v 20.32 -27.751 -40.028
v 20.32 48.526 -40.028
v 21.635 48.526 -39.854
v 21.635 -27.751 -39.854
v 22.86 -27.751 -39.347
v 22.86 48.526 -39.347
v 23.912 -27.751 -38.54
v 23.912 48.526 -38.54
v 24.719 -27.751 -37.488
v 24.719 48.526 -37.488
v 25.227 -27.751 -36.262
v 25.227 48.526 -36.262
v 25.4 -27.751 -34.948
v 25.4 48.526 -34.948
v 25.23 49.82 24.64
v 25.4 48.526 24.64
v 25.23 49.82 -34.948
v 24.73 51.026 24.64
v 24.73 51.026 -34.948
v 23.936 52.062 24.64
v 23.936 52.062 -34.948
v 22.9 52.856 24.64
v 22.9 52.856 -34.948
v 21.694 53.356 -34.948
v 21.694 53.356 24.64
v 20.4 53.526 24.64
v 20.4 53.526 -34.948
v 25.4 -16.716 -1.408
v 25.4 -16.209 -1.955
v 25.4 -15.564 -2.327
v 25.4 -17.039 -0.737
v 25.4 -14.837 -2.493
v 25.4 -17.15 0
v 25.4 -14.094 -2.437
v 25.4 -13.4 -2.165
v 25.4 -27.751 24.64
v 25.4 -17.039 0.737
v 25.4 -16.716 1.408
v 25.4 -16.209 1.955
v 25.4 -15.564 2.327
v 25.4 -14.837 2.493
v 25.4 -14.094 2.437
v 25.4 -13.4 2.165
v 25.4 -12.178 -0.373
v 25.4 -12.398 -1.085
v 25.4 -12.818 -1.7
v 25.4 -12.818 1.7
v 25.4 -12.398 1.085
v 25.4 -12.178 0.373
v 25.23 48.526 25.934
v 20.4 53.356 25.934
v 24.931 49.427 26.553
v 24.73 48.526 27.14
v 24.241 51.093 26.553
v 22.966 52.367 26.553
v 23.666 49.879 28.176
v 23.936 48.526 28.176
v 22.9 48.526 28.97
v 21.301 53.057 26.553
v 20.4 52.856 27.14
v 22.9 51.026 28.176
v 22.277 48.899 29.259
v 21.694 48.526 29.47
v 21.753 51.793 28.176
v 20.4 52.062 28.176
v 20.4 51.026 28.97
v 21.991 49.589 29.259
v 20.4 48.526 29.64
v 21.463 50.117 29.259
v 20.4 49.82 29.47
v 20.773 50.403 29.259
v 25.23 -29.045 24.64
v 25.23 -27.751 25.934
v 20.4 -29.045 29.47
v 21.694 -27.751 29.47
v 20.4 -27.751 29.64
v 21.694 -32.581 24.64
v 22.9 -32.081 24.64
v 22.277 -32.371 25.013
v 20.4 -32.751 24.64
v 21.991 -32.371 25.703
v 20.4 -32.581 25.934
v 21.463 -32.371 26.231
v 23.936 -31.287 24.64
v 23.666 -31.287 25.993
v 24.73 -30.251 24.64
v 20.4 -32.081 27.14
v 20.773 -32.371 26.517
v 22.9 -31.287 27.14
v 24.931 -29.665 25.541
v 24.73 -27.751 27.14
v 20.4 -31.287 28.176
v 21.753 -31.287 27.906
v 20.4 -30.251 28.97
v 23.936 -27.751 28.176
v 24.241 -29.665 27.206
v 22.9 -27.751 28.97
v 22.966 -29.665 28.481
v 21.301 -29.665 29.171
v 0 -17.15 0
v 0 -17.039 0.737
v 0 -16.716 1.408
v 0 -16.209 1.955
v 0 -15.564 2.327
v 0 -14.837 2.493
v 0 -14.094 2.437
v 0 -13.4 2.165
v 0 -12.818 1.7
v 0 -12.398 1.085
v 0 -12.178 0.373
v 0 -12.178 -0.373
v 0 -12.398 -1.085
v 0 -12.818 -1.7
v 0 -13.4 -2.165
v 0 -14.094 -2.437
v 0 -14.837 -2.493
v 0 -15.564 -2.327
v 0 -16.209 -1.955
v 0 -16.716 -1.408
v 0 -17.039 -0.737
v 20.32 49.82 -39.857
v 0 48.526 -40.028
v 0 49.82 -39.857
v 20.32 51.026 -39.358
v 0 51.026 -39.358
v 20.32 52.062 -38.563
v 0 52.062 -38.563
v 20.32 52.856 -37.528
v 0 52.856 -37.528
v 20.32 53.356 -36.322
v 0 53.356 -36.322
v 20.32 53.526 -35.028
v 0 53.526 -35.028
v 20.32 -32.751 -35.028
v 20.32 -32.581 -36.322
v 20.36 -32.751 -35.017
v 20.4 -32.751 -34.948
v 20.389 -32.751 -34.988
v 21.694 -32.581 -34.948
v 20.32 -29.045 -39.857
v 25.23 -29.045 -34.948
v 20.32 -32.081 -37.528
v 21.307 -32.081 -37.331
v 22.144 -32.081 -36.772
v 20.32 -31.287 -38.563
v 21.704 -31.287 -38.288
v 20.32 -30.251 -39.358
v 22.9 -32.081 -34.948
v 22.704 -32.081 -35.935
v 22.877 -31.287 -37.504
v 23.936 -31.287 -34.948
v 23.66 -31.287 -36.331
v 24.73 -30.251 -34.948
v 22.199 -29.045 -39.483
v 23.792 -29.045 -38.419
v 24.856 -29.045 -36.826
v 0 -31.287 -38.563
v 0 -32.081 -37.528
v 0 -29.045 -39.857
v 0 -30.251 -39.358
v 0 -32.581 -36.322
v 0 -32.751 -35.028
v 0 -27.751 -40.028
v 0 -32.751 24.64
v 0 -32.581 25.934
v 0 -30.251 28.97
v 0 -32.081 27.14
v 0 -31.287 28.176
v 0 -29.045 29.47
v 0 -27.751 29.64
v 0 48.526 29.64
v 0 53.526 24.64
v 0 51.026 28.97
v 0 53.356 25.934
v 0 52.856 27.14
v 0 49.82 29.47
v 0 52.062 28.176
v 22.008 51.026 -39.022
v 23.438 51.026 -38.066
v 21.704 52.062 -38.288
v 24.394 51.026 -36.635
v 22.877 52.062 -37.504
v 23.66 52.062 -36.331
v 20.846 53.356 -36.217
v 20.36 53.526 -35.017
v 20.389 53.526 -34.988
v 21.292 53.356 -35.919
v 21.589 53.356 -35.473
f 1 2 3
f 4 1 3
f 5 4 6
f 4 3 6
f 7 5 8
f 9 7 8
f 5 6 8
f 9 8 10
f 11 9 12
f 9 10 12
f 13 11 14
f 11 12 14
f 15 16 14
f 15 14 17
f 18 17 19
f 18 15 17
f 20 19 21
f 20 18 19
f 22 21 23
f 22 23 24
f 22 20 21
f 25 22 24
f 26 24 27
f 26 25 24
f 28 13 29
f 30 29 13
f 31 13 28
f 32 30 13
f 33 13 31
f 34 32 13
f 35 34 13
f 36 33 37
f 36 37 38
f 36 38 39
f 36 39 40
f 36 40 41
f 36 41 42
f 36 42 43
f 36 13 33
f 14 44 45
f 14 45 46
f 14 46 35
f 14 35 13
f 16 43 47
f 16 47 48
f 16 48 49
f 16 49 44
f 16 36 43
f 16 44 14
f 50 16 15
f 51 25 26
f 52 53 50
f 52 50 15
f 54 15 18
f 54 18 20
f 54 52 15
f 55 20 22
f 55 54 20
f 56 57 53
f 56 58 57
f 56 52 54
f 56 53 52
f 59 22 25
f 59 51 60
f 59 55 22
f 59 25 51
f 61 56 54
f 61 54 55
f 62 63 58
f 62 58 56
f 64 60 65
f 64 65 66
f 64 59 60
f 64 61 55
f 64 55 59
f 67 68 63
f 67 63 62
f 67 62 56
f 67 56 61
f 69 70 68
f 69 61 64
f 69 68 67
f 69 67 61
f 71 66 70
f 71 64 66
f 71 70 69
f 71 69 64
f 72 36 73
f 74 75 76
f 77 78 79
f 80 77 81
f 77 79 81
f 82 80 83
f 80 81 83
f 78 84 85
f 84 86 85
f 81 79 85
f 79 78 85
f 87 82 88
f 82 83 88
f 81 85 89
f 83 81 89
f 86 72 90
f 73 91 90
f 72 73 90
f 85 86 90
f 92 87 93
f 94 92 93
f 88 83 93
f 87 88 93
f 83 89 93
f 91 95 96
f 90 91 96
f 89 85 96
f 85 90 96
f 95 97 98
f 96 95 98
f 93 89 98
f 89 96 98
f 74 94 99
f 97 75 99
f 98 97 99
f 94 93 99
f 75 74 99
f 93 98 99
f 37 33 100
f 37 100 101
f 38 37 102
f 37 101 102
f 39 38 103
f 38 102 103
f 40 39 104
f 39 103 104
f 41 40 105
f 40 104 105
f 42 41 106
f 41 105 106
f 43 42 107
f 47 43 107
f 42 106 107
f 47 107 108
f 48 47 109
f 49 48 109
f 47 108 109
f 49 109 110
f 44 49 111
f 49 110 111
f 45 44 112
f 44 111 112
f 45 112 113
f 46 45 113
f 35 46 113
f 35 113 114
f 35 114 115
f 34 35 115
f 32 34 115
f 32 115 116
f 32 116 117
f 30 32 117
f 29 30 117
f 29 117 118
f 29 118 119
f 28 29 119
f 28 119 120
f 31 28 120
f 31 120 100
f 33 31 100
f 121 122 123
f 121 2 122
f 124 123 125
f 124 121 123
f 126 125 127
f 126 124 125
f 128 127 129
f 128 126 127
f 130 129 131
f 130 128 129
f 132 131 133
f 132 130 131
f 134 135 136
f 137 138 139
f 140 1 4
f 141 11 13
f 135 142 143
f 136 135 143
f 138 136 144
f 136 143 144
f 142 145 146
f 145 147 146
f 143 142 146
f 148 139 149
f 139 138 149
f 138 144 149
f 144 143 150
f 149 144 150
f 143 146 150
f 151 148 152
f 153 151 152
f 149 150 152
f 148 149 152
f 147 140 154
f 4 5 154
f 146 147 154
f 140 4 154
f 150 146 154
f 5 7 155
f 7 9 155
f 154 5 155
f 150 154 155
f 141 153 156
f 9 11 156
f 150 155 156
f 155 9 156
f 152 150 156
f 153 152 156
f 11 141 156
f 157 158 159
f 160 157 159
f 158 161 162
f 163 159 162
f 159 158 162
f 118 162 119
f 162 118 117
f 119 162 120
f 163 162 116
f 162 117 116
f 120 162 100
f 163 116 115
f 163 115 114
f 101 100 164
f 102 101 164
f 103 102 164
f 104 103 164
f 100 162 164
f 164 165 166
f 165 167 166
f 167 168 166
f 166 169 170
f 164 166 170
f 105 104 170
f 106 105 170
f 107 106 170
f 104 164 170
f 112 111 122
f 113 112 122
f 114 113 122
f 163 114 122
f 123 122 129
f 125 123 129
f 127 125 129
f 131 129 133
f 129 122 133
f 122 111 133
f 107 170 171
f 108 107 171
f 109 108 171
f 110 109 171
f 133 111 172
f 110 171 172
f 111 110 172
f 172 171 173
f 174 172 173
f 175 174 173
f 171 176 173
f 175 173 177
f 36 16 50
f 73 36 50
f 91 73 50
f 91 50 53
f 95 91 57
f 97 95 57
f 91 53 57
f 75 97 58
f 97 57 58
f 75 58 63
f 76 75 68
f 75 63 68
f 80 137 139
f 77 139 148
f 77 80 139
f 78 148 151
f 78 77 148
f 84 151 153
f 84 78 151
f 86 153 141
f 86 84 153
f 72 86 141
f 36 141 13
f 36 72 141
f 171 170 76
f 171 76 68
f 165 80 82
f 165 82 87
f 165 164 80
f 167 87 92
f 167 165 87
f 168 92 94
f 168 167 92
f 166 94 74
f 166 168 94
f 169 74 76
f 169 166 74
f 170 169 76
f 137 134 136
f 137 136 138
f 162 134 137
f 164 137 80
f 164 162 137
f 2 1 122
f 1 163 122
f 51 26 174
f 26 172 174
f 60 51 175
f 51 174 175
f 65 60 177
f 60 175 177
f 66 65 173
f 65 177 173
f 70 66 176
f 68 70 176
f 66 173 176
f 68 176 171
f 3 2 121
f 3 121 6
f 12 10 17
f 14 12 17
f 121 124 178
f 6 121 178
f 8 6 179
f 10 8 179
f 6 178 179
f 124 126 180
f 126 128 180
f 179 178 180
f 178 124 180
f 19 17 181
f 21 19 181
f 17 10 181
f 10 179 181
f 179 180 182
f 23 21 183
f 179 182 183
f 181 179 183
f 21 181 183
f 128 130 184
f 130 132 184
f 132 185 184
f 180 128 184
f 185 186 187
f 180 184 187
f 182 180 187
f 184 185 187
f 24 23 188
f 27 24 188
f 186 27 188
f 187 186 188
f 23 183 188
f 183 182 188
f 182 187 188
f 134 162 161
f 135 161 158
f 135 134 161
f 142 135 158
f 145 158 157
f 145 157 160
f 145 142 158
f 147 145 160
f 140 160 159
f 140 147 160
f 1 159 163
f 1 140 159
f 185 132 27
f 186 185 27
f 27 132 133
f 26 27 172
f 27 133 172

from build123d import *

# Parameters (mm, degrees)
F0_W     = 86.277299
F0_H     = 69.66754
F1_DEPTH = 25.4
F2_R     = 5.08
F3_R     = 5
F4_R     = 5
F5_R     = 5
F7_D     = 5


with BuildPart() as f1:
    # F0 (on Right) → F1 (new body)
    with BuildSketch(Plane.YZ):
        with Locations((10.387514, -5.193766)):
            Rectangle(F0_W, F0_H)
    extrude(amount=F1_DEPTH)

    # F2
    f2_edges = [f1.edges().sort_by_distance(p)[0] for p in [
        (25.4, 10.387514, -40.027536),
    ]]
    fillet(f2_edges, radius=F2_R)

    # F3
    f3_edges = [f1.edges().sort_by_distance(p)[0] for p in [
        (25.4, 53.526163, -2.653766),
    ]]
    fillet(f3_edges, radius=F3_R)

    # F4
    f4_edges = [f1.edges().sort_by_distance(p)[0] for p in [
        (25.4, 7.887514, 29.640004),
    ]]
    fillet(f4_edges, radius=F4_R)

    # F5
    f5_edges = [f1.edges().sort_by_distance(p)[0] for p in [
        (25.4, -32.751136, -5.153766),
    ]]
    fillet(f5_edges, radius=F5_R)

    # F7 (through all)
    with Locations(Plane.YZ.offset(25.4)):
        with Locations((-14.6505, 0)):
            Hole(F7_D / 2)


solid = f1.part
